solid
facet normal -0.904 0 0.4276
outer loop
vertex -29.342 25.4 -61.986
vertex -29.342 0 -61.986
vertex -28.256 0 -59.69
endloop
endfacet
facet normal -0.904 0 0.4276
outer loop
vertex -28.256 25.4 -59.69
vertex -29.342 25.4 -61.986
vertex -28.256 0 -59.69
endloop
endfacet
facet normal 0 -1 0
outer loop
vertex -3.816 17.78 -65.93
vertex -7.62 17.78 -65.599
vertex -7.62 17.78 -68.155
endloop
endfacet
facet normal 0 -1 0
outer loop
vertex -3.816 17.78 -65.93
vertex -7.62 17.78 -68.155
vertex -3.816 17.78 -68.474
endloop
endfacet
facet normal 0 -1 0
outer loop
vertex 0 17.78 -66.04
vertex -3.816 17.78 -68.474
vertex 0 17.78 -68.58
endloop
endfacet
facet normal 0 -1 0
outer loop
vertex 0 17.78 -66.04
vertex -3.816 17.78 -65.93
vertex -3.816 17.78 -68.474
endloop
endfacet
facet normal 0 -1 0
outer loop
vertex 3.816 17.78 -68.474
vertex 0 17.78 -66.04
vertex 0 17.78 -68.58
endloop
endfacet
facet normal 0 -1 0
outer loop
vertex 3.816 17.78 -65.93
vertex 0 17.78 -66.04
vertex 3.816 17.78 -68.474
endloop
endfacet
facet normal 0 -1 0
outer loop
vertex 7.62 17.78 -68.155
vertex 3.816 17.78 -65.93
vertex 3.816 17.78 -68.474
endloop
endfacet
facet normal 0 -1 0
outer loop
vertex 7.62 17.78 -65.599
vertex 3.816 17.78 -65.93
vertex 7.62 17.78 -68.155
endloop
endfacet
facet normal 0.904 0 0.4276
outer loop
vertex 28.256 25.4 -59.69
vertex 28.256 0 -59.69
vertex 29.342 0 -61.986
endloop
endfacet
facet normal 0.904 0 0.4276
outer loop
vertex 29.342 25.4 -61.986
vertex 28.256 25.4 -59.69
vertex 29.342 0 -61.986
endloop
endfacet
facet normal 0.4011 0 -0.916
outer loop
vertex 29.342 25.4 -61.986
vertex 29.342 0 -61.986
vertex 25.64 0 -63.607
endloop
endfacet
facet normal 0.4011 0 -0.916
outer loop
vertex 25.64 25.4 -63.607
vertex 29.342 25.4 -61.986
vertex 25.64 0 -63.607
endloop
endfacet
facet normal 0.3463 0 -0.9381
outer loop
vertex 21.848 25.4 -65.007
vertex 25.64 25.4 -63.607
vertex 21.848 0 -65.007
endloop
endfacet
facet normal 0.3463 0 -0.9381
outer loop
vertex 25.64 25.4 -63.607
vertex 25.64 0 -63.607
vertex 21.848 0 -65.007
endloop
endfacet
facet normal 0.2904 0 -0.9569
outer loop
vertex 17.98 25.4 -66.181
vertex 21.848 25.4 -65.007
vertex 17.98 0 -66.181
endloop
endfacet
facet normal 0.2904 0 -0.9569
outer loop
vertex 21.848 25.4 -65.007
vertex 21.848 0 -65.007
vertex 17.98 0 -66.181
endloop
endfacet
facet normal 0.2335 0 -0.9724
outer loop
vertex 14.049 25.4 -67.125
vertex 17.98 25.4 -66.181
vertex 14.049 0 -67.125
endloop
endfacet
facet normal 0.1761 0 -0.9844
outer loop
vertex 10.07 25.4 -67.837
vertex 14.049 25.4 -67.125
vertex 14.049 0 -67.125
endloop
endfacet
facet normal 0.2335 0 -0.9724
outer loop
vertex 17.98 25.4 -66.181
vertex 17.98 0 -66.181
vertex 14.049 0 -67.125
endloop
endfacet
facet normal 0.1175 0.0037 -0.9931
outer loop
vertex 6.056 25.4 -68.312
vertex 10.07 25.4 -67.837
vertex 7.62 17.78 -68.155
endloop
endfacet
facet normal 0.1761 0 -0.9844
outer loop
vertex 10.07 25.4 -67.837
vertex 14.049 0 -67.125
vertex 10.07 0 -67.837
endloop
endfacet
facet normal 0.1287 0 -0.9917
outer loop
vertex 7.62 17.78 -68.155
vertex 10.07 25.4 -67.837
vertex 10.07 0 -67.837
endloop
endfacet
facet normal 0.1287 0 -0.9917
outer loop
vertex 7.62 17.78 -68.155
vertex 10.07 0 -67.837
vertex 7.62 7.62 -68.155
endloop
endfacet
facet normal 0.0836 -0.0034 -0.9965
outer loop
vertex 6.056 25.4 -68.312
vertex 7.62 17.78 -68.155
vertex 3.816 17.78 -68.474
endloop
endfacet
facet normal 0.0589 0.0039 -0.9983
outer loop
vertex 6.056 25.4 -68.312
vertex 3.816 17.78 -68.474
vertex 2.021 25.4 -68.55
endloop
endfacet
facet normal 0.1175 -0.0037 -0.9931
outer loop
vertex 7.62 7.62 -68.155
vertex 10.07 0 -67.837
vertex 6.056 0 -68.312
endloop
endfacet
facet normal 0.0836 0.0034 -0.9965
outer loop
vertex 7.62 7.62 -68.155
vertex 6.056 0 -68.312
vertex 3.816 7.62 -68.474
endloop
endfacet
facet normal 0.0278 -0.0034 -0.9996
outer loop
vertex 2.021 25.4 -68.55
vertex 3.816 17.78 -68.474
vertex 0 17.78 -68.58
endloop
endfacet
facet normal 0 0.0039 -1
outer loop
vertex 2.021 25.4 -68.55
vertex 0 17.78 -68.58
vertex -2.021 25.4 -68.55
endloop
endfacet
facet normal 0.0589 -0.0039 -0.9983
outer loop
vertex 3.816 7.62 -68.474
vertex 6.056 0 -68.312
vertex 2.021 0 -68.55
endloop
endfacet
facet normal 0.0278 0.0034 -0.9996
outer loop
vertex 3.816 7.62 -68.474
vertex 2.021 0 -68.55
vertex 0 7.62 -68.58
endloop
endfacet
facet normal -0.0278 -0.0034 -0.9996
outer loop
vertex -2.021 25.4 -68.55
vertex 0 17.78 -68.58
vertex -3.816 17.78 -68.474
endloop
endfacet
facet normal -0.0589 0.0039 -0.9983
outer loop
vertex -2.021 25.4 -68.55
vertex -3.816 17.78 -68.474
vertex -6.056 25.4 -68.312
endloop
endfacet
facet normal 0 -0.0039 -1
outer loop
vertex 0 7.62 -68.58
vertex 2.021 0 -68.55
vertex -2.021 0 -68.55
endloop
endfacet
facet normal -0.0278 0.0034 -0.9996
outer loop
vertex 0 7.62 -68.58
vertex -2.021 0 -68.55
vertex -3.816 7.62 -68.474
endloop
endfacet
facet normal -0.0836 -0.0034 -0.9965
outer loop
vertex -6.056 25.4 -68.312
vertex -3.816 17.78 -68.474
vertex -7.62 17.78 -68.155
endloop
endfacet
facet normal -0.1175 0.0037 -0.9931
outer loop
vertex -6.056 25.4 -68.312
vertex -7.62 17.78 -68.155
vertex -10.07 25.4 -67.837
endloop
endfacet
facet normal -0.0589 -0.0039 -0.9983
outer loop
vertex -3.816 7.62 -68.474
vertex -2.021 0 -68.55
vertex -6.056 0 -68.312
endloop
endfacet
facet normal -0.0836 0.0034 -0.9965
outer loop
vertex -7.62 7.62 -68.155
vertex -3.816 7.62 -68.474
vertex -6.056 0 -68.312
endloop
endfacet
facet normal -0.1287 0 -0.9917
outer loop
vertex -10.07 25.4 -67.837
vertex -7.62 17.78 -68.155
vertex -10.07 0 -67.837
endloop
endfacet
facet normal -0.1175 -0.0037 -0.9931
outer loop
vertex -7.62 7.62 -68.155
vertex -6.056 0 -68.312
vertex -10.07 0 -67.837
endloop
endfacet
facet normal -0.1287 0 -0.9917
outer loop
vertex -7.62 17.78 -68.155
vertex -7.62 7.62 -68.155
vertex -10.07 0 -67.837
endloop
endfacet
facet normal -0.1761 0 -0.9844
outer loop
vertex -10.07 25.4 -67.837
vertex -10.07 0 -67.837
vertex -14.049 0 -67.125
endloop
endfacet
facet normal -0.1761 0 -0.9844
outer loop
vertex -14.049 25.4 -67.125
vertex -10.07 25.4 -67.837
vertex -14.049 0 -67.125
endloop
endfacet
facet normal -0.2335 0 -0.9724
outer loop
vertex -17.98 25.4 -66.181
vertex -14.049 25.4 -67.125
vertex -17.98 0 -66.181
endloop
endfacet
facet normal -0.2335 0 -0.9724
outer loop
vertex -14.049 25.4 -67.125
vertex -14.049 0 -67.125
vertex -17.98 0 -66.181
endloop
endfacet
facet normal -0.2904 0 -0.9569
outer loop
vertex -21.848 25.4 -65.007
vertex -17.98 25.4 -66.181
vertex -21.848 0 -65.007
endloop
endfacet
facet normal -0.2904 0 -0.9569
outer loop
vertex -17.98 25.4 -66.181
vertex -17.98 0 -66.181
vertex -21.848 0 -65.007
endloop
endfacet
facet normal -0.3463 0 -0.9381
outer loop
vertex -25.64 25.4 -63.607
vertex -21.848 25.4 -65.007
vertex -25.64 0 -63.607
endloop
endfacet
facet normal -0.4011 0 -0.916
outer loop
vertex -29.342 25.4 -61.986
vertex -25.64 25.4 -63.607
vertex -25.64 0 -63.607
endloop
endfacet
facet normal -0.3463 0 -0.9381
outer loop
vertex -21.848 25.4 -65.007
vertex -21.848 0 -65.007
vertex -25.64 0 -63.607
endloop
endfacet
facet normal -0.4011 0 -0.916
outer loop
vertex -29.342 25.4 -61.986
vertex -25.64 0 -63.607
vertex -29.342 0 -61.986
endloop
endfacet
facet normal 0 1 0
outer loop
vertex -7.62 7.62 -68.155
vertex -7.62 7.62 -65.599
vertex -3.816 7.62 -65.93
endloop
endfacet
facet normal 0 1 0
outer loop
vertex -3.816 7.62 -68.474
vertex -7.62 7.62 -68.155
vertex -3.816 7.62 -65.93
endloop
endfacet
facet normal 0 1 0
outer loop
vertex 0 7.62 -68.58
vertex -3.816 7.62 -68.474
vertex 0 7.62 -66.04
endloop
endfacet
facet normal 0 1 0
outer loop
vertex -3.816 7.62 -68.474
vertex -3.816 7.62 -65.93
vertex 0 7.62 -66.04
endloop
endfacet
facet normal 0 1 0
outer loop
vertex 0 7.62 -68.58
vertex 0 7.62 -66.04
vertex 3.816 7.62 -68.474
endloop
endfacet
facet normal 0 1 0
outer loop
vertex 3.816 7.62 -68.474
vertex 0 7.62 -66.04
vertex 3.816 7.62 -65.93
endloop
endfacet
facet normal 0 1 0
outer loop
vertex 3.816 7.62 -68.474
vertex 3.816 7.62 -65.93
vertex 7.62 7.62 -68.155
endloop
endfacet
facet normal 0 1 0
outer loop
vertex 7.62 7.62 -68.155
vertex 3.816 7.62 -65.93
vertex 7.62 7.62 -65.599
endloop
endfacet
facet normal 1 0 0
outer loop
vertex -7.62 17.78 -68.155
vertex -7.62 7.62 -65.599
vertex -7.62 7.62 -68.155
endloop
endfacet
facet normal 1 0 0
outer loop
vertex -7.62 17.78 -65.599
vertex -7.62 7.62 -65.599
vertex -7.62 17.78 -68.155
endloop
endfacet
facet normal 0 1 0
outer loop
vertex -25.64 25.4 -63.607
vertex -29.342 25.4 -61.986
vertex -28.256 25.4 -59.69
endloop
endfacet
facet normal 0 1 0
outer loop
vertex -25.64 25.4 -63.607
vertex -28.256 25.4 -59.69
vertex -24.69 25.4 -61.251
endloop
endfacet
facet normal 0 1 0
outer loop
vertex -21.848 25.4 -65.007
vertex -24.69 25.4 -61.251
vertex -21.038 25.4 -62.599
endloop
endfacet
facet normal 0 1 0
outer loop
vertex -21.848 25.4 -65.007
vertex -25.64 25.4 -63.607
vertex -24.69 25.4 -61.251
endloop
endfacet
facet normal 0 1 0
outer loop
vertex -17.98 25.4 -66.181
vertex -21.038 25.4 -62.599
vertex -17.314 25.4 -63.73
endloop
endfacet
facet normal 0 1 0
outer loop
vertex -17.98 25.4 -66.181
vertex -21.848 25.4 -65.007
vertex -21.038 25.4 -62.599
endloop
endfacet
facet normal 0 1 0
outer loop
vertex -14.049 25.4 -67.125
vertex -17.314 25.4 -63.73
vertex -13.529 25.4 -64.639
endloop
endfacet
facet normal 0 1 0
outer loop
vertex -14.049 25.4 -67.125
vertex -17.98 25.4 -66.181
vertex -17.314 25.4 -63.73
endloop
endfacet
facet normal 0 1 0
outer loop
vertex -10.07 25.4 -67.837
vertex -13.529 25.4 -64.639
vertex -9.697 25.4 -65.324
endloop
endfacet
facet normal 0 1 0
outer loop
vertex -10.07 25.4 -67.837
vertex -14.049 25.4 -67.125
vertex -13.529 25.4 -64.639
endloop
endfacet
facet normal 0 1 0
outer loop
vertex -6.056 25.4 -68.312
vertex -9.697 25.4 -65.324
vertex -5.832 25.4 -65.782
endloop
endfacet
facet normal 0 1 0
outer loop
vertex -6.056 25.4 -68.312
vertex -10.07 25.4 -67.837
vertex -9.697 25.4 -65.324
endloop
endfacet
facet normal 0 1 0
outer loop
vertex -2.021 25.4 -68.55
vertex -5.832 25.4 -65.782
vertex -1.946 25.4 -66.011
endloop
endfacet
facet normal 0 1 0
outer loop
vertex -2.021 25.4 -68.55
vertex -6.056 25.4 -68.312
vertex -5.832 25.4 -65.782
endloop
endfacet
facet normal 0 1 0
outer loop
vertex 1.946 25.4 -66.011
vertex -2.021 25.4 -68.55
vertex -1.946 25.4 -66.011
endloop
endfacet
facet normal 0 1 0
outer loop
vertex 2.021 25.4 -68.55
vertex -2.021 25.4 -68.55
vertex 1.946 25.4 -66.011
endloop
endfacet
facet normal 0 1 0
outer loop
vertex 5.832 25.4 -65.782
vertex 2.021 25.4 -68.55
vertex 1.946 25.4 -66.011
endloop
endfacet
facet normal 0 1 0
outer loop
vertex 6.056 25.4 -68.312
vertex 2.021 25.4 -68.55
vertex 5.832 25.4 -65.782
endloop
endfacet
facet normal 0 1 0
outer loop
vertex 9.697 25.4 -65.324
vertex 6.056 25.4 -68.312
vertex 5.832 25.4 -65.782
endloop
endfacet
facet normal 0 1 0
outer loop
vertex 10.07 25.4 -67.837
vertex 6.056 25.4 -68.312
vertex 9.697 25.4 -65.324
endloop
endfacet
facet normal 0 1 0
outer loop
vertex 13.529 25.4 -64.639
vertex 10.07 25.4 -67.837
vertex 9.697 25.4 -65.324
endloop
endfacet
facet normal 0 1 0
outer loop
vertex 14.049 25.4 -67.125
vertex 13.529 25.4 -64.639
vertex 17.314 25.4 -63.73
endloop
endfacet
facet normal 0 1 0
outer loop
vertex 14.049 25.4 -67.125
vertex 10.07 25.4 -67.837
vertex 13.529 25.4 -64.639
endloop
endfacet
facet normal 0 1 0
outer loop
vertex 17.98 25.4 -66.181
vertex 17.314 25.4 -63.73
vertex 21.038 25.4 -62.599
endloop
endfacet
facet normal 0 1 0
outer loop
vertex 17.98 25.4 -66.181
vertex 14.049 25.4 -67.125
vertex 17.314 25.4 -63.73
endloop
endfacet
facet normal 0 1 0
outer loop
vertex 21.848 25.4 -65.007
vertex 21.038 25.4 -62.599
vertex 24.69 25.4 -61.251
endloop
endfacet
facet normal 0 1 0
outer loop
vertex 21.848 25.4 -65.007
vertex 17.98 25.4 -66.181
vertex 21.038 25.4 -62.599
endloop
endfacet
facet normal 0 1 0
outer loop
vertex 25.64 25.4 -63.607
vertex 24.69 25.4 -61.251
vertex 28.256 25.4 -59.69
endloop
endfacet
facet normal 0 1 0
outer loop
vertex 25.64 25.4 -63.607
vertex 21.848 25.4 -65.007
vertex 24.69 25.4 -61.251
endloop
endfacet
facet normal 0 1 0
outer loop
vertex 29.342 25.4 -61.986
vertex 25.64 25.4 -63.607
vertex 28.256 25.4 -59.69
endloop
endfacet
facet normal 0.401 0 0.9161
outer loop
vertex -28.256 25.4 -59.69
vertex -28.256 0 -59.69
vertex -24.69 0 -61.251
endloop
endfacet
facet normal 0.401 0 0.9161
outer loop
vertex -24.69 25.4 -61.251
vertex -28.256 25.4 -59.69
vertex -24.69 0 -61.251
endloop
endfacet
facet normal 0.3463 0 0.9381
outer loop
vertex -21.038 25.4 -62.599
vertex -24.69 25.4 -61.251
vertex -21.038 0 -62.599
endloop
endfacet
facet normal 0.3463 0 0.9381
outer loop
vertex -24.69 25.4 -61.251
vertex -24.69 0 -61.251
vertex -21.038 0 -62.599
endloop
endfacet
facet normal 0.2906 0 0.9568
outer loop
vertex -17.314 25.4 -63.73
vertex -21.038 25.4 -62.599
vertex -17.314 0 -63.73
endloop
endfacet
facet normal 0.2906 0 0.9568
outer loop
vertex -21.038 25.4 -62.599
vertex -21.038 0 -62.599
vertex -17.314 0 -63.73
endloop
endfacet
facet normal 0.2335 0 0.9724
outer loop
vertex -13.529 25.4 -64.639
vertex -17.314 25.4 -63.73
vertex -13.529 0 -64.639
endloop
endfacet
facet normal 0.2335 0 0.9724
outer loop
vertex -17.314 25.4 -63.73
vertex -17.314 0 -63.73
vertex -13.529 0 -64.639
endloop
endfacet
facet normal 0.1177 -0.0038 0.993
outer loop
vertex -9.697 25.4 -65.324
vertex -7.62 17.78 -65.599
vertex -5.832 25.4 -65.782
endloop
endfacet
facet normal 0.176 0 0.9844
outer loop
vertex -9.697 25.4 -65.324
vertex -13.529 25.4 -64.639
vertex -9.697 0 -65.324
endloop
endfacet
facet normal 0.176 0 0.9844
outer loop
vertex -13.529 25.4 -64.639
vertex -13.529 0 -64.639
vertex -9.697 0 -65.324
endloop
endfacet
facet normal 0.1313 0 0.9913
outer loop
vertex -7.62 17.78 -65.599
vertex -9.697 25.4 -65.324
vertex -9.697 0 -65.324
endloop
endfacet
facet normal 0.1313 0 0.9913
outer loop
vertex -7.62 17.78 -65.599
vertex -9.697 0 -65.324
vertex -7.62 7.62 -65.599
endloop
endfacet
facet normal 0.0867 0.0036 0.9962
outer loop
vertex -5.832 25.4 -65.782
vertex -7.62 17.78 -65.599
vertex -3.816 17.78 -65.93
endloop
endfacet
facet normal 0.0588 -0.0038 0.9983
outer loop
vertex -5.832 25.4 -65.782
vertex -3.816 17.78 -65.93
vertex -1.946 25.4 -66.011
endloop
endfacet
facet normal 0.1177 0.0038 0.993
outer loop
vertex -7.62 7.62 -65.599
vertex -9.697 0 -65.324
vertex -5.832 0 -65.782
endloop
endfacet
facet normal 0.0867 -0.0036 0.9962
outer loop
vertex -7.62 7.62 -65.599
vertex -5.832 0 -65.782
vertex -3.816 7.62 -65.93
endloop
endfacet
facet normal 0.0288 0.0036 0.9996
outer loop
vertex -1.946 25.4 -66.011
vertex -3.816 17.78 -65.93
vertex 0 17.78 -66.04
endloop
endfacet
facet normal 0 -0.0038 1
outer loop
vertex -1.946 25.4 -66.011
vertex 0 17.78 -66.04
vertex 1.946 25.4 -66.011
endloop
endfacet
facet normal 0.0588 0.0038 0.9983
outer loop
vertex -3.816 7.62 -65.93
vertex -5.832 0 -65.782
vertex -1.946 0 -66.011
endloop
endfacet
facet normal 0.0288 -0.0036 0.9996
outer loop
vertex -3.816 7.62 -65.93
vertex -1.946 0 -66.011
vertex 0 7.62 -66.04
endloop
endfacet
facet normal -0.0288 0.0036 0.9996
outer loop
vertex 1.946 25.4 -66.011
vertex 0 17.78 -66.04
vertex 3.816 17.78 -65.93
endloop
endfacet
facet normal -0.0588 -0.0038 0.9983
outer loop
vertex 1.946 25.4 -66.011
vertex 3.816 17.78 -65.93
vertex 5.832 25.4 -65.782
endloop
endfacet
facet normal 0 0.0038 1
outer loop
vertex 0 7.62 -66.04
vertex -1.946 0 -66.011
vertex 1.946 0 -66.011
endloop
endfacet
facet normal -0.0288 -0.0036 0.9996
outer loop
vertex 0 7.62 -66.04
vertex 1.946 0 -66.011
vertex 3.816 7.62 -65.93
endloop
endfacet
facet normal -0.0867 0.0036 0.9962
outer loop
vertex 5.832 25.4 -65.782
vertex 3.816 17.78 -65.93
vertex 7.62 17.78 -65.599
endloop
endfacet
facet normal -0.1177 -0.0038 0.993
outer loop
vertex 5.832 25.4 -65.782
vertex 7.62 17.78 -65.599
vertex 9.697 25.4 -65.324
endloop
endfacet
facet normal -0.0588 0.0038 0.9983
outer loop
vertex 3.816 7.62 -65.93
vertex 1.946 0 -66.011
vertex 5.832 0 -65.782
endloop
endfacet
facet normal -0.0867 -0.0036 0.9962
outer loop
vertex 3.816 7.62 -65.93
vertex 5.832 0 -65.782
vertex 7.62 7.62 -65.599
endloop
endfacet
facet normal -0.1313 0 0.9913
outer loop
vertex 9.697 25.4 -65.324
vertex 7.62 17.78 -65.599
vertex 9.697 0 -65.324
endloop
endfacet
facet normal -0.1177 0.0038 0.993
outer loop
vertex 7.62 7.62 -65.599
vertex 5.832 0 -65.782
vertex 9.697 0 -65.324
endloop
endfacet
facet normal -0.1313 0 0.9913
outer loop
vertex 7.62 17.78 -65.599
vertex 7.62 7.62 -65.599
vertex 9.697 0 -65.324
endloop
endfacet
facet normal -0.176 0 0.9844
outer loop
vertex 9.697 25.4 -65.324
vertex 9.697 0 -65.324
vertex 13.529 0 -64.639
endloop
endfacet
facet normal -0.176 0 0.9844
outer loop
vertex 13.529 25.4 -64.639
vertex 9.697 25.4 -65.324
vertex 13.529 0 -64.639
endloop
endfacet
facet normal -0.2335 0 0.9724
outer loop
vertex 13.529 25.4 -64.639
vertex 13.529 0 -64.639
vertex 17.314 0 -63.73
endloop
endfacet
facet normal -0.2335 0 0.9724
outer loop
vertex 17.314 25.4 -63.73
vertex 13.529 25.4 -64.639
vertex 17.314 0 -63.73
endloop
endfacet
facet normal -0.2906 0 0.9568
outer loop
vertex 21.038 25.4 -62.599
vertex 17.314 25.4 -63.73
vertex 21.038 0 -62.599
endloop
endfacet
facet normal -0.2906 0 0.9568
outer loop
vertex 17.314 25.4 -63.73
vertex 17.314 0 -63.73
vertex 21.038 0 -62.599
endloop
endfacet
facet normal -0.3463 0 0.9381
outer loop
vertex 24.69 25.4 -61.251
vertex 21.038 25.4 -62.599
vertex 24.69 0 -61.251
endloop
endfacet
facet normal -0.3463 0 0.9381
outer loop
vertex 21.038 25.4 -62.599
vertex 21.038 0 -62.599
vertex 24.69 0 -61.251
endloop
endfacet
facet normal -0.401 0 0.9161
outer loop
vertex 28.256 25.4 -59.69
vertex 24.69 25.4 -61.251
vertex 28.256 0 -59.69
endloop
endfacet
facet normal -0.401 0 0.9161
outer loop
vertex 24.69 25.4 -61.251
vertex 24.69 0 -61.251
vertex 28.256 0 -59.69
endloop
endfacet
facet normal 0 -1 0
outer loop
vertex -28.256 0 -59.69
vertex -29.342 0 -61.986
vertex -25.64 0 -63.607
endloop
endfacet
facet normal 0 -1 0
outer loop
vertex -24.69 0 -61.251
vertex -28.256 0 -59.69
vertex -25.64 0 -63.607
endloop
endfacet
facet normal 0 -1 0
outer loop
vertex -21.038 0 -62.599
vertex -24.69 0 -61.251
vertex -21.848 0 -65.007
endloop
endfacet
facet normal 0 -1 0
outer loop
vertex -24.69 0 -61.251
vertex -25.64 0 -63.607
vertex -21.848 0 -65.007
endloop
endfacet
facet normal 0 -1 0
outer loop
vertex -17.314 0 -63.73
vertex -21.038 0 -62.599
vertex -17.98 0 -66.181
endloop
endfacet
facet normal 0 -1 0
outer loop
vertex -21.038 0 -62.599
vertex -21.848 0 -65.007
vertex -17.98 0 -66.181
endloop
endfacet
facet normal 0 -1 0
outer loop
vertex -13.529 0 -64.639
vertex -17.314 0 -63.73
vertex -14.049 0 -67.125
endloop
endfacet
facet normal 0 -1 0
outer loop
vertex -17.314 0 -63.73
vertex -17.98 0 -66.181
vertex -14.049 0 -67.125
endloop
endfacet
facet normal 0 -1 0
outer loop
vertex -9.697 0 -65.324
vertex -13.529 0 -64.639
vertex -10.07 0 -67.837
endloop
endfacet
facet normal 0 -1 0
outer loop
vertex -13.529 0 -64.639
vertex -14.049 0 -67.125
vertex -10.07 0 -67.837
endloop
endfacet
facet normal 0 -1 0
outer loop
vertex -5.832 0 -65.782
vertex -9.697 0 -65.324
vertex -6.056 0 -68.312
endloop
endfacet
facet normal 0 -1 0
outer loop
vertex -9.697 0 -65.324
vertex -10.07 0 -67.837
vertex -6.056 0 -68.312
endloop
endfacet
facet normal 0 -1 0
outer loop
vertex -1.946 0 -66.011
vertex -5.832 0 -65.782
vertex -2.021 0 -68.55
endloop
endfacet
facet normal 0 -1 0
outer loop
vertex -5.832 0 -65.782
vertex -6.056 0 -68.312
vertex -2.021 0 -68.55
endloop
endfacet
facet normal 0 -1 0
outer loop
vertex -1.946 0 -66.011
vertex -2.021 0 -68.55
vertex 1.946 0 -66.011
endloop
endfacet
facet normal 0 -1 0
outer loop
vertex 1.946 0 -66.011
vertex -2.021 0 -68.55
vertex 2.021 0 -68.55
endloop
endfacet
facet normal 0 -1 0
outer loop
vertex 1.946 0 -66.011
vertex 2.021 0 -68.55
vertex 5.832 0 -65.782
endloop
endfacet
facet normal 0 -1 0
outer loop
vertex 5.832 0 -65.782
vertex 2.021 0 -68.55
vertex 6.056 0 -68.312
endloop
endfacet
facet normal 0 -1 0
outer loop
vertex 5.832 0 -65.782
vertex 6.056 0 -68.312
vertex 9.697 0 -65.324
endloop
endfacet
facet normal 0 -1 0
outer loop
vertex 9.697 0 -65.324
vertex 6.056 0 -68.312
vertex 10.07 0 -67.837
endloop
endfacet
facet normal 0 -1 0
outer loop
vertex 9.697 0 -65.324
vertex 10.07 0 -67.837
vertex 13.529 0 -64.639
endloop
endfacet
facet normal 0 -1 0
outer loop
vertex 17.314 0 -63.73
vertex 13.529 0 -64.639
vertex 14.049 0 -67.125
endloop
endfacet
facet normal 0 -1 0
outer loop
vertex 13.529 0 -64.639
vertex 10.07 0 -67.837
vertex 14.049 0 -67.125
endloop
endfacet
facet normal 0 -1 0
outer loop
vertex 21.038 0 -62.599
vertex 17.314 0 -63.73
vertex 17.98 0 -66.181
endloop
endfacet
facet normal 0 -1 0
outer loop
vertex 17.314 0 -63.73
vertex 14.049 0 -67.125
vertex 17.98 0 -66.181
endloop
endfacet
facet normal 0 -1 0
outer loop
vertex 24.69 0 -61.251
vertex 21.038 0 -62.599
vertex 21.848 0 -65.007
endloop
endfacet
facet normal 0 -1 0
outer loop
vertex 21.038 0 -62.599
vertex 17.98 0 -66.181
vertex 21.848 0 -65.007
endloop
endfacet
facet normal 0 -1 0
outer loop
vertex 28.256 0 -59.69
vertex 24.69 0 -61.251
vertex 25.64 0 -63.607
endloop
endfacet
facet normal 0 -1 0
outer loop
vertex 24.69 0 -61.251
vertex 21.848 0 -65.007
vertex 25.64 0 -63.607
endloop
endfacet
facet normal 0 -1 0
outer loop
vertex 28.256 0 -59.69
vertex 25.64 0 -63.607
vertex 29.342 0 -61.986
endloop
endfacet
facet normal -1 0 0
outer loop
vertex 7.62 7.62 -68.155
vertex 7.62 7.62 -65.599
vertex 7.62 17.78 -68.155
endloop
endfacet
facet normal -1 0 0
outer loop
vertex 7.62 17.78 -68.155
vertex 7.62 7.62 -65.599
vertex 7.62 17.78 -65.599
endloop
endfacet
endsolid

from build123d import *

# Parameters (mm, degrees)
BOSS_EXTRUDE1_DEPTH = 25.4
SKETCH2_W           = 15.24
SKETCH2_H           = 10.16
CUT_EXTRUDE1_DEPTH  = 144.272


with BuildPart() as part:
    # Sketch1 → Boss-Extrude1 (new body)
    with BuildSketch(Plane(origin=(0, 0, 0), x_dir=(1, 0, 0), z_dir=(0, 1, 0))):
        with BuildLine():
            Line((-29.342474553, 61.985769231), (-28.255716236, 59.69))
            ThreePointArc((-28.255716236, 59.69), (0, 66.04), (28.255716236, 59.69))
            Line((28.255716236, 59.69), (29.342474553, 61.985769231))
            ThreePointArc((29.342474553, 61.985769231), (0, 68.58), (-29.342474553, 61.985769231))
        make_face()
    extrude(amount=BOSS_EXTRUDE1_DEPTH)

    # Sketch2 → Cut-Extrude1 (cut)
    with BuildSketch(Plane.XY):
        with Locations((0, 12.7)):
            Rectangle(SKETCH2_W, SKETCH2_H)
    extrude(amount=-CUT_EXTRUDE1_DEPTH, mode=Mode.SUBTRACT)


solid = part.part
